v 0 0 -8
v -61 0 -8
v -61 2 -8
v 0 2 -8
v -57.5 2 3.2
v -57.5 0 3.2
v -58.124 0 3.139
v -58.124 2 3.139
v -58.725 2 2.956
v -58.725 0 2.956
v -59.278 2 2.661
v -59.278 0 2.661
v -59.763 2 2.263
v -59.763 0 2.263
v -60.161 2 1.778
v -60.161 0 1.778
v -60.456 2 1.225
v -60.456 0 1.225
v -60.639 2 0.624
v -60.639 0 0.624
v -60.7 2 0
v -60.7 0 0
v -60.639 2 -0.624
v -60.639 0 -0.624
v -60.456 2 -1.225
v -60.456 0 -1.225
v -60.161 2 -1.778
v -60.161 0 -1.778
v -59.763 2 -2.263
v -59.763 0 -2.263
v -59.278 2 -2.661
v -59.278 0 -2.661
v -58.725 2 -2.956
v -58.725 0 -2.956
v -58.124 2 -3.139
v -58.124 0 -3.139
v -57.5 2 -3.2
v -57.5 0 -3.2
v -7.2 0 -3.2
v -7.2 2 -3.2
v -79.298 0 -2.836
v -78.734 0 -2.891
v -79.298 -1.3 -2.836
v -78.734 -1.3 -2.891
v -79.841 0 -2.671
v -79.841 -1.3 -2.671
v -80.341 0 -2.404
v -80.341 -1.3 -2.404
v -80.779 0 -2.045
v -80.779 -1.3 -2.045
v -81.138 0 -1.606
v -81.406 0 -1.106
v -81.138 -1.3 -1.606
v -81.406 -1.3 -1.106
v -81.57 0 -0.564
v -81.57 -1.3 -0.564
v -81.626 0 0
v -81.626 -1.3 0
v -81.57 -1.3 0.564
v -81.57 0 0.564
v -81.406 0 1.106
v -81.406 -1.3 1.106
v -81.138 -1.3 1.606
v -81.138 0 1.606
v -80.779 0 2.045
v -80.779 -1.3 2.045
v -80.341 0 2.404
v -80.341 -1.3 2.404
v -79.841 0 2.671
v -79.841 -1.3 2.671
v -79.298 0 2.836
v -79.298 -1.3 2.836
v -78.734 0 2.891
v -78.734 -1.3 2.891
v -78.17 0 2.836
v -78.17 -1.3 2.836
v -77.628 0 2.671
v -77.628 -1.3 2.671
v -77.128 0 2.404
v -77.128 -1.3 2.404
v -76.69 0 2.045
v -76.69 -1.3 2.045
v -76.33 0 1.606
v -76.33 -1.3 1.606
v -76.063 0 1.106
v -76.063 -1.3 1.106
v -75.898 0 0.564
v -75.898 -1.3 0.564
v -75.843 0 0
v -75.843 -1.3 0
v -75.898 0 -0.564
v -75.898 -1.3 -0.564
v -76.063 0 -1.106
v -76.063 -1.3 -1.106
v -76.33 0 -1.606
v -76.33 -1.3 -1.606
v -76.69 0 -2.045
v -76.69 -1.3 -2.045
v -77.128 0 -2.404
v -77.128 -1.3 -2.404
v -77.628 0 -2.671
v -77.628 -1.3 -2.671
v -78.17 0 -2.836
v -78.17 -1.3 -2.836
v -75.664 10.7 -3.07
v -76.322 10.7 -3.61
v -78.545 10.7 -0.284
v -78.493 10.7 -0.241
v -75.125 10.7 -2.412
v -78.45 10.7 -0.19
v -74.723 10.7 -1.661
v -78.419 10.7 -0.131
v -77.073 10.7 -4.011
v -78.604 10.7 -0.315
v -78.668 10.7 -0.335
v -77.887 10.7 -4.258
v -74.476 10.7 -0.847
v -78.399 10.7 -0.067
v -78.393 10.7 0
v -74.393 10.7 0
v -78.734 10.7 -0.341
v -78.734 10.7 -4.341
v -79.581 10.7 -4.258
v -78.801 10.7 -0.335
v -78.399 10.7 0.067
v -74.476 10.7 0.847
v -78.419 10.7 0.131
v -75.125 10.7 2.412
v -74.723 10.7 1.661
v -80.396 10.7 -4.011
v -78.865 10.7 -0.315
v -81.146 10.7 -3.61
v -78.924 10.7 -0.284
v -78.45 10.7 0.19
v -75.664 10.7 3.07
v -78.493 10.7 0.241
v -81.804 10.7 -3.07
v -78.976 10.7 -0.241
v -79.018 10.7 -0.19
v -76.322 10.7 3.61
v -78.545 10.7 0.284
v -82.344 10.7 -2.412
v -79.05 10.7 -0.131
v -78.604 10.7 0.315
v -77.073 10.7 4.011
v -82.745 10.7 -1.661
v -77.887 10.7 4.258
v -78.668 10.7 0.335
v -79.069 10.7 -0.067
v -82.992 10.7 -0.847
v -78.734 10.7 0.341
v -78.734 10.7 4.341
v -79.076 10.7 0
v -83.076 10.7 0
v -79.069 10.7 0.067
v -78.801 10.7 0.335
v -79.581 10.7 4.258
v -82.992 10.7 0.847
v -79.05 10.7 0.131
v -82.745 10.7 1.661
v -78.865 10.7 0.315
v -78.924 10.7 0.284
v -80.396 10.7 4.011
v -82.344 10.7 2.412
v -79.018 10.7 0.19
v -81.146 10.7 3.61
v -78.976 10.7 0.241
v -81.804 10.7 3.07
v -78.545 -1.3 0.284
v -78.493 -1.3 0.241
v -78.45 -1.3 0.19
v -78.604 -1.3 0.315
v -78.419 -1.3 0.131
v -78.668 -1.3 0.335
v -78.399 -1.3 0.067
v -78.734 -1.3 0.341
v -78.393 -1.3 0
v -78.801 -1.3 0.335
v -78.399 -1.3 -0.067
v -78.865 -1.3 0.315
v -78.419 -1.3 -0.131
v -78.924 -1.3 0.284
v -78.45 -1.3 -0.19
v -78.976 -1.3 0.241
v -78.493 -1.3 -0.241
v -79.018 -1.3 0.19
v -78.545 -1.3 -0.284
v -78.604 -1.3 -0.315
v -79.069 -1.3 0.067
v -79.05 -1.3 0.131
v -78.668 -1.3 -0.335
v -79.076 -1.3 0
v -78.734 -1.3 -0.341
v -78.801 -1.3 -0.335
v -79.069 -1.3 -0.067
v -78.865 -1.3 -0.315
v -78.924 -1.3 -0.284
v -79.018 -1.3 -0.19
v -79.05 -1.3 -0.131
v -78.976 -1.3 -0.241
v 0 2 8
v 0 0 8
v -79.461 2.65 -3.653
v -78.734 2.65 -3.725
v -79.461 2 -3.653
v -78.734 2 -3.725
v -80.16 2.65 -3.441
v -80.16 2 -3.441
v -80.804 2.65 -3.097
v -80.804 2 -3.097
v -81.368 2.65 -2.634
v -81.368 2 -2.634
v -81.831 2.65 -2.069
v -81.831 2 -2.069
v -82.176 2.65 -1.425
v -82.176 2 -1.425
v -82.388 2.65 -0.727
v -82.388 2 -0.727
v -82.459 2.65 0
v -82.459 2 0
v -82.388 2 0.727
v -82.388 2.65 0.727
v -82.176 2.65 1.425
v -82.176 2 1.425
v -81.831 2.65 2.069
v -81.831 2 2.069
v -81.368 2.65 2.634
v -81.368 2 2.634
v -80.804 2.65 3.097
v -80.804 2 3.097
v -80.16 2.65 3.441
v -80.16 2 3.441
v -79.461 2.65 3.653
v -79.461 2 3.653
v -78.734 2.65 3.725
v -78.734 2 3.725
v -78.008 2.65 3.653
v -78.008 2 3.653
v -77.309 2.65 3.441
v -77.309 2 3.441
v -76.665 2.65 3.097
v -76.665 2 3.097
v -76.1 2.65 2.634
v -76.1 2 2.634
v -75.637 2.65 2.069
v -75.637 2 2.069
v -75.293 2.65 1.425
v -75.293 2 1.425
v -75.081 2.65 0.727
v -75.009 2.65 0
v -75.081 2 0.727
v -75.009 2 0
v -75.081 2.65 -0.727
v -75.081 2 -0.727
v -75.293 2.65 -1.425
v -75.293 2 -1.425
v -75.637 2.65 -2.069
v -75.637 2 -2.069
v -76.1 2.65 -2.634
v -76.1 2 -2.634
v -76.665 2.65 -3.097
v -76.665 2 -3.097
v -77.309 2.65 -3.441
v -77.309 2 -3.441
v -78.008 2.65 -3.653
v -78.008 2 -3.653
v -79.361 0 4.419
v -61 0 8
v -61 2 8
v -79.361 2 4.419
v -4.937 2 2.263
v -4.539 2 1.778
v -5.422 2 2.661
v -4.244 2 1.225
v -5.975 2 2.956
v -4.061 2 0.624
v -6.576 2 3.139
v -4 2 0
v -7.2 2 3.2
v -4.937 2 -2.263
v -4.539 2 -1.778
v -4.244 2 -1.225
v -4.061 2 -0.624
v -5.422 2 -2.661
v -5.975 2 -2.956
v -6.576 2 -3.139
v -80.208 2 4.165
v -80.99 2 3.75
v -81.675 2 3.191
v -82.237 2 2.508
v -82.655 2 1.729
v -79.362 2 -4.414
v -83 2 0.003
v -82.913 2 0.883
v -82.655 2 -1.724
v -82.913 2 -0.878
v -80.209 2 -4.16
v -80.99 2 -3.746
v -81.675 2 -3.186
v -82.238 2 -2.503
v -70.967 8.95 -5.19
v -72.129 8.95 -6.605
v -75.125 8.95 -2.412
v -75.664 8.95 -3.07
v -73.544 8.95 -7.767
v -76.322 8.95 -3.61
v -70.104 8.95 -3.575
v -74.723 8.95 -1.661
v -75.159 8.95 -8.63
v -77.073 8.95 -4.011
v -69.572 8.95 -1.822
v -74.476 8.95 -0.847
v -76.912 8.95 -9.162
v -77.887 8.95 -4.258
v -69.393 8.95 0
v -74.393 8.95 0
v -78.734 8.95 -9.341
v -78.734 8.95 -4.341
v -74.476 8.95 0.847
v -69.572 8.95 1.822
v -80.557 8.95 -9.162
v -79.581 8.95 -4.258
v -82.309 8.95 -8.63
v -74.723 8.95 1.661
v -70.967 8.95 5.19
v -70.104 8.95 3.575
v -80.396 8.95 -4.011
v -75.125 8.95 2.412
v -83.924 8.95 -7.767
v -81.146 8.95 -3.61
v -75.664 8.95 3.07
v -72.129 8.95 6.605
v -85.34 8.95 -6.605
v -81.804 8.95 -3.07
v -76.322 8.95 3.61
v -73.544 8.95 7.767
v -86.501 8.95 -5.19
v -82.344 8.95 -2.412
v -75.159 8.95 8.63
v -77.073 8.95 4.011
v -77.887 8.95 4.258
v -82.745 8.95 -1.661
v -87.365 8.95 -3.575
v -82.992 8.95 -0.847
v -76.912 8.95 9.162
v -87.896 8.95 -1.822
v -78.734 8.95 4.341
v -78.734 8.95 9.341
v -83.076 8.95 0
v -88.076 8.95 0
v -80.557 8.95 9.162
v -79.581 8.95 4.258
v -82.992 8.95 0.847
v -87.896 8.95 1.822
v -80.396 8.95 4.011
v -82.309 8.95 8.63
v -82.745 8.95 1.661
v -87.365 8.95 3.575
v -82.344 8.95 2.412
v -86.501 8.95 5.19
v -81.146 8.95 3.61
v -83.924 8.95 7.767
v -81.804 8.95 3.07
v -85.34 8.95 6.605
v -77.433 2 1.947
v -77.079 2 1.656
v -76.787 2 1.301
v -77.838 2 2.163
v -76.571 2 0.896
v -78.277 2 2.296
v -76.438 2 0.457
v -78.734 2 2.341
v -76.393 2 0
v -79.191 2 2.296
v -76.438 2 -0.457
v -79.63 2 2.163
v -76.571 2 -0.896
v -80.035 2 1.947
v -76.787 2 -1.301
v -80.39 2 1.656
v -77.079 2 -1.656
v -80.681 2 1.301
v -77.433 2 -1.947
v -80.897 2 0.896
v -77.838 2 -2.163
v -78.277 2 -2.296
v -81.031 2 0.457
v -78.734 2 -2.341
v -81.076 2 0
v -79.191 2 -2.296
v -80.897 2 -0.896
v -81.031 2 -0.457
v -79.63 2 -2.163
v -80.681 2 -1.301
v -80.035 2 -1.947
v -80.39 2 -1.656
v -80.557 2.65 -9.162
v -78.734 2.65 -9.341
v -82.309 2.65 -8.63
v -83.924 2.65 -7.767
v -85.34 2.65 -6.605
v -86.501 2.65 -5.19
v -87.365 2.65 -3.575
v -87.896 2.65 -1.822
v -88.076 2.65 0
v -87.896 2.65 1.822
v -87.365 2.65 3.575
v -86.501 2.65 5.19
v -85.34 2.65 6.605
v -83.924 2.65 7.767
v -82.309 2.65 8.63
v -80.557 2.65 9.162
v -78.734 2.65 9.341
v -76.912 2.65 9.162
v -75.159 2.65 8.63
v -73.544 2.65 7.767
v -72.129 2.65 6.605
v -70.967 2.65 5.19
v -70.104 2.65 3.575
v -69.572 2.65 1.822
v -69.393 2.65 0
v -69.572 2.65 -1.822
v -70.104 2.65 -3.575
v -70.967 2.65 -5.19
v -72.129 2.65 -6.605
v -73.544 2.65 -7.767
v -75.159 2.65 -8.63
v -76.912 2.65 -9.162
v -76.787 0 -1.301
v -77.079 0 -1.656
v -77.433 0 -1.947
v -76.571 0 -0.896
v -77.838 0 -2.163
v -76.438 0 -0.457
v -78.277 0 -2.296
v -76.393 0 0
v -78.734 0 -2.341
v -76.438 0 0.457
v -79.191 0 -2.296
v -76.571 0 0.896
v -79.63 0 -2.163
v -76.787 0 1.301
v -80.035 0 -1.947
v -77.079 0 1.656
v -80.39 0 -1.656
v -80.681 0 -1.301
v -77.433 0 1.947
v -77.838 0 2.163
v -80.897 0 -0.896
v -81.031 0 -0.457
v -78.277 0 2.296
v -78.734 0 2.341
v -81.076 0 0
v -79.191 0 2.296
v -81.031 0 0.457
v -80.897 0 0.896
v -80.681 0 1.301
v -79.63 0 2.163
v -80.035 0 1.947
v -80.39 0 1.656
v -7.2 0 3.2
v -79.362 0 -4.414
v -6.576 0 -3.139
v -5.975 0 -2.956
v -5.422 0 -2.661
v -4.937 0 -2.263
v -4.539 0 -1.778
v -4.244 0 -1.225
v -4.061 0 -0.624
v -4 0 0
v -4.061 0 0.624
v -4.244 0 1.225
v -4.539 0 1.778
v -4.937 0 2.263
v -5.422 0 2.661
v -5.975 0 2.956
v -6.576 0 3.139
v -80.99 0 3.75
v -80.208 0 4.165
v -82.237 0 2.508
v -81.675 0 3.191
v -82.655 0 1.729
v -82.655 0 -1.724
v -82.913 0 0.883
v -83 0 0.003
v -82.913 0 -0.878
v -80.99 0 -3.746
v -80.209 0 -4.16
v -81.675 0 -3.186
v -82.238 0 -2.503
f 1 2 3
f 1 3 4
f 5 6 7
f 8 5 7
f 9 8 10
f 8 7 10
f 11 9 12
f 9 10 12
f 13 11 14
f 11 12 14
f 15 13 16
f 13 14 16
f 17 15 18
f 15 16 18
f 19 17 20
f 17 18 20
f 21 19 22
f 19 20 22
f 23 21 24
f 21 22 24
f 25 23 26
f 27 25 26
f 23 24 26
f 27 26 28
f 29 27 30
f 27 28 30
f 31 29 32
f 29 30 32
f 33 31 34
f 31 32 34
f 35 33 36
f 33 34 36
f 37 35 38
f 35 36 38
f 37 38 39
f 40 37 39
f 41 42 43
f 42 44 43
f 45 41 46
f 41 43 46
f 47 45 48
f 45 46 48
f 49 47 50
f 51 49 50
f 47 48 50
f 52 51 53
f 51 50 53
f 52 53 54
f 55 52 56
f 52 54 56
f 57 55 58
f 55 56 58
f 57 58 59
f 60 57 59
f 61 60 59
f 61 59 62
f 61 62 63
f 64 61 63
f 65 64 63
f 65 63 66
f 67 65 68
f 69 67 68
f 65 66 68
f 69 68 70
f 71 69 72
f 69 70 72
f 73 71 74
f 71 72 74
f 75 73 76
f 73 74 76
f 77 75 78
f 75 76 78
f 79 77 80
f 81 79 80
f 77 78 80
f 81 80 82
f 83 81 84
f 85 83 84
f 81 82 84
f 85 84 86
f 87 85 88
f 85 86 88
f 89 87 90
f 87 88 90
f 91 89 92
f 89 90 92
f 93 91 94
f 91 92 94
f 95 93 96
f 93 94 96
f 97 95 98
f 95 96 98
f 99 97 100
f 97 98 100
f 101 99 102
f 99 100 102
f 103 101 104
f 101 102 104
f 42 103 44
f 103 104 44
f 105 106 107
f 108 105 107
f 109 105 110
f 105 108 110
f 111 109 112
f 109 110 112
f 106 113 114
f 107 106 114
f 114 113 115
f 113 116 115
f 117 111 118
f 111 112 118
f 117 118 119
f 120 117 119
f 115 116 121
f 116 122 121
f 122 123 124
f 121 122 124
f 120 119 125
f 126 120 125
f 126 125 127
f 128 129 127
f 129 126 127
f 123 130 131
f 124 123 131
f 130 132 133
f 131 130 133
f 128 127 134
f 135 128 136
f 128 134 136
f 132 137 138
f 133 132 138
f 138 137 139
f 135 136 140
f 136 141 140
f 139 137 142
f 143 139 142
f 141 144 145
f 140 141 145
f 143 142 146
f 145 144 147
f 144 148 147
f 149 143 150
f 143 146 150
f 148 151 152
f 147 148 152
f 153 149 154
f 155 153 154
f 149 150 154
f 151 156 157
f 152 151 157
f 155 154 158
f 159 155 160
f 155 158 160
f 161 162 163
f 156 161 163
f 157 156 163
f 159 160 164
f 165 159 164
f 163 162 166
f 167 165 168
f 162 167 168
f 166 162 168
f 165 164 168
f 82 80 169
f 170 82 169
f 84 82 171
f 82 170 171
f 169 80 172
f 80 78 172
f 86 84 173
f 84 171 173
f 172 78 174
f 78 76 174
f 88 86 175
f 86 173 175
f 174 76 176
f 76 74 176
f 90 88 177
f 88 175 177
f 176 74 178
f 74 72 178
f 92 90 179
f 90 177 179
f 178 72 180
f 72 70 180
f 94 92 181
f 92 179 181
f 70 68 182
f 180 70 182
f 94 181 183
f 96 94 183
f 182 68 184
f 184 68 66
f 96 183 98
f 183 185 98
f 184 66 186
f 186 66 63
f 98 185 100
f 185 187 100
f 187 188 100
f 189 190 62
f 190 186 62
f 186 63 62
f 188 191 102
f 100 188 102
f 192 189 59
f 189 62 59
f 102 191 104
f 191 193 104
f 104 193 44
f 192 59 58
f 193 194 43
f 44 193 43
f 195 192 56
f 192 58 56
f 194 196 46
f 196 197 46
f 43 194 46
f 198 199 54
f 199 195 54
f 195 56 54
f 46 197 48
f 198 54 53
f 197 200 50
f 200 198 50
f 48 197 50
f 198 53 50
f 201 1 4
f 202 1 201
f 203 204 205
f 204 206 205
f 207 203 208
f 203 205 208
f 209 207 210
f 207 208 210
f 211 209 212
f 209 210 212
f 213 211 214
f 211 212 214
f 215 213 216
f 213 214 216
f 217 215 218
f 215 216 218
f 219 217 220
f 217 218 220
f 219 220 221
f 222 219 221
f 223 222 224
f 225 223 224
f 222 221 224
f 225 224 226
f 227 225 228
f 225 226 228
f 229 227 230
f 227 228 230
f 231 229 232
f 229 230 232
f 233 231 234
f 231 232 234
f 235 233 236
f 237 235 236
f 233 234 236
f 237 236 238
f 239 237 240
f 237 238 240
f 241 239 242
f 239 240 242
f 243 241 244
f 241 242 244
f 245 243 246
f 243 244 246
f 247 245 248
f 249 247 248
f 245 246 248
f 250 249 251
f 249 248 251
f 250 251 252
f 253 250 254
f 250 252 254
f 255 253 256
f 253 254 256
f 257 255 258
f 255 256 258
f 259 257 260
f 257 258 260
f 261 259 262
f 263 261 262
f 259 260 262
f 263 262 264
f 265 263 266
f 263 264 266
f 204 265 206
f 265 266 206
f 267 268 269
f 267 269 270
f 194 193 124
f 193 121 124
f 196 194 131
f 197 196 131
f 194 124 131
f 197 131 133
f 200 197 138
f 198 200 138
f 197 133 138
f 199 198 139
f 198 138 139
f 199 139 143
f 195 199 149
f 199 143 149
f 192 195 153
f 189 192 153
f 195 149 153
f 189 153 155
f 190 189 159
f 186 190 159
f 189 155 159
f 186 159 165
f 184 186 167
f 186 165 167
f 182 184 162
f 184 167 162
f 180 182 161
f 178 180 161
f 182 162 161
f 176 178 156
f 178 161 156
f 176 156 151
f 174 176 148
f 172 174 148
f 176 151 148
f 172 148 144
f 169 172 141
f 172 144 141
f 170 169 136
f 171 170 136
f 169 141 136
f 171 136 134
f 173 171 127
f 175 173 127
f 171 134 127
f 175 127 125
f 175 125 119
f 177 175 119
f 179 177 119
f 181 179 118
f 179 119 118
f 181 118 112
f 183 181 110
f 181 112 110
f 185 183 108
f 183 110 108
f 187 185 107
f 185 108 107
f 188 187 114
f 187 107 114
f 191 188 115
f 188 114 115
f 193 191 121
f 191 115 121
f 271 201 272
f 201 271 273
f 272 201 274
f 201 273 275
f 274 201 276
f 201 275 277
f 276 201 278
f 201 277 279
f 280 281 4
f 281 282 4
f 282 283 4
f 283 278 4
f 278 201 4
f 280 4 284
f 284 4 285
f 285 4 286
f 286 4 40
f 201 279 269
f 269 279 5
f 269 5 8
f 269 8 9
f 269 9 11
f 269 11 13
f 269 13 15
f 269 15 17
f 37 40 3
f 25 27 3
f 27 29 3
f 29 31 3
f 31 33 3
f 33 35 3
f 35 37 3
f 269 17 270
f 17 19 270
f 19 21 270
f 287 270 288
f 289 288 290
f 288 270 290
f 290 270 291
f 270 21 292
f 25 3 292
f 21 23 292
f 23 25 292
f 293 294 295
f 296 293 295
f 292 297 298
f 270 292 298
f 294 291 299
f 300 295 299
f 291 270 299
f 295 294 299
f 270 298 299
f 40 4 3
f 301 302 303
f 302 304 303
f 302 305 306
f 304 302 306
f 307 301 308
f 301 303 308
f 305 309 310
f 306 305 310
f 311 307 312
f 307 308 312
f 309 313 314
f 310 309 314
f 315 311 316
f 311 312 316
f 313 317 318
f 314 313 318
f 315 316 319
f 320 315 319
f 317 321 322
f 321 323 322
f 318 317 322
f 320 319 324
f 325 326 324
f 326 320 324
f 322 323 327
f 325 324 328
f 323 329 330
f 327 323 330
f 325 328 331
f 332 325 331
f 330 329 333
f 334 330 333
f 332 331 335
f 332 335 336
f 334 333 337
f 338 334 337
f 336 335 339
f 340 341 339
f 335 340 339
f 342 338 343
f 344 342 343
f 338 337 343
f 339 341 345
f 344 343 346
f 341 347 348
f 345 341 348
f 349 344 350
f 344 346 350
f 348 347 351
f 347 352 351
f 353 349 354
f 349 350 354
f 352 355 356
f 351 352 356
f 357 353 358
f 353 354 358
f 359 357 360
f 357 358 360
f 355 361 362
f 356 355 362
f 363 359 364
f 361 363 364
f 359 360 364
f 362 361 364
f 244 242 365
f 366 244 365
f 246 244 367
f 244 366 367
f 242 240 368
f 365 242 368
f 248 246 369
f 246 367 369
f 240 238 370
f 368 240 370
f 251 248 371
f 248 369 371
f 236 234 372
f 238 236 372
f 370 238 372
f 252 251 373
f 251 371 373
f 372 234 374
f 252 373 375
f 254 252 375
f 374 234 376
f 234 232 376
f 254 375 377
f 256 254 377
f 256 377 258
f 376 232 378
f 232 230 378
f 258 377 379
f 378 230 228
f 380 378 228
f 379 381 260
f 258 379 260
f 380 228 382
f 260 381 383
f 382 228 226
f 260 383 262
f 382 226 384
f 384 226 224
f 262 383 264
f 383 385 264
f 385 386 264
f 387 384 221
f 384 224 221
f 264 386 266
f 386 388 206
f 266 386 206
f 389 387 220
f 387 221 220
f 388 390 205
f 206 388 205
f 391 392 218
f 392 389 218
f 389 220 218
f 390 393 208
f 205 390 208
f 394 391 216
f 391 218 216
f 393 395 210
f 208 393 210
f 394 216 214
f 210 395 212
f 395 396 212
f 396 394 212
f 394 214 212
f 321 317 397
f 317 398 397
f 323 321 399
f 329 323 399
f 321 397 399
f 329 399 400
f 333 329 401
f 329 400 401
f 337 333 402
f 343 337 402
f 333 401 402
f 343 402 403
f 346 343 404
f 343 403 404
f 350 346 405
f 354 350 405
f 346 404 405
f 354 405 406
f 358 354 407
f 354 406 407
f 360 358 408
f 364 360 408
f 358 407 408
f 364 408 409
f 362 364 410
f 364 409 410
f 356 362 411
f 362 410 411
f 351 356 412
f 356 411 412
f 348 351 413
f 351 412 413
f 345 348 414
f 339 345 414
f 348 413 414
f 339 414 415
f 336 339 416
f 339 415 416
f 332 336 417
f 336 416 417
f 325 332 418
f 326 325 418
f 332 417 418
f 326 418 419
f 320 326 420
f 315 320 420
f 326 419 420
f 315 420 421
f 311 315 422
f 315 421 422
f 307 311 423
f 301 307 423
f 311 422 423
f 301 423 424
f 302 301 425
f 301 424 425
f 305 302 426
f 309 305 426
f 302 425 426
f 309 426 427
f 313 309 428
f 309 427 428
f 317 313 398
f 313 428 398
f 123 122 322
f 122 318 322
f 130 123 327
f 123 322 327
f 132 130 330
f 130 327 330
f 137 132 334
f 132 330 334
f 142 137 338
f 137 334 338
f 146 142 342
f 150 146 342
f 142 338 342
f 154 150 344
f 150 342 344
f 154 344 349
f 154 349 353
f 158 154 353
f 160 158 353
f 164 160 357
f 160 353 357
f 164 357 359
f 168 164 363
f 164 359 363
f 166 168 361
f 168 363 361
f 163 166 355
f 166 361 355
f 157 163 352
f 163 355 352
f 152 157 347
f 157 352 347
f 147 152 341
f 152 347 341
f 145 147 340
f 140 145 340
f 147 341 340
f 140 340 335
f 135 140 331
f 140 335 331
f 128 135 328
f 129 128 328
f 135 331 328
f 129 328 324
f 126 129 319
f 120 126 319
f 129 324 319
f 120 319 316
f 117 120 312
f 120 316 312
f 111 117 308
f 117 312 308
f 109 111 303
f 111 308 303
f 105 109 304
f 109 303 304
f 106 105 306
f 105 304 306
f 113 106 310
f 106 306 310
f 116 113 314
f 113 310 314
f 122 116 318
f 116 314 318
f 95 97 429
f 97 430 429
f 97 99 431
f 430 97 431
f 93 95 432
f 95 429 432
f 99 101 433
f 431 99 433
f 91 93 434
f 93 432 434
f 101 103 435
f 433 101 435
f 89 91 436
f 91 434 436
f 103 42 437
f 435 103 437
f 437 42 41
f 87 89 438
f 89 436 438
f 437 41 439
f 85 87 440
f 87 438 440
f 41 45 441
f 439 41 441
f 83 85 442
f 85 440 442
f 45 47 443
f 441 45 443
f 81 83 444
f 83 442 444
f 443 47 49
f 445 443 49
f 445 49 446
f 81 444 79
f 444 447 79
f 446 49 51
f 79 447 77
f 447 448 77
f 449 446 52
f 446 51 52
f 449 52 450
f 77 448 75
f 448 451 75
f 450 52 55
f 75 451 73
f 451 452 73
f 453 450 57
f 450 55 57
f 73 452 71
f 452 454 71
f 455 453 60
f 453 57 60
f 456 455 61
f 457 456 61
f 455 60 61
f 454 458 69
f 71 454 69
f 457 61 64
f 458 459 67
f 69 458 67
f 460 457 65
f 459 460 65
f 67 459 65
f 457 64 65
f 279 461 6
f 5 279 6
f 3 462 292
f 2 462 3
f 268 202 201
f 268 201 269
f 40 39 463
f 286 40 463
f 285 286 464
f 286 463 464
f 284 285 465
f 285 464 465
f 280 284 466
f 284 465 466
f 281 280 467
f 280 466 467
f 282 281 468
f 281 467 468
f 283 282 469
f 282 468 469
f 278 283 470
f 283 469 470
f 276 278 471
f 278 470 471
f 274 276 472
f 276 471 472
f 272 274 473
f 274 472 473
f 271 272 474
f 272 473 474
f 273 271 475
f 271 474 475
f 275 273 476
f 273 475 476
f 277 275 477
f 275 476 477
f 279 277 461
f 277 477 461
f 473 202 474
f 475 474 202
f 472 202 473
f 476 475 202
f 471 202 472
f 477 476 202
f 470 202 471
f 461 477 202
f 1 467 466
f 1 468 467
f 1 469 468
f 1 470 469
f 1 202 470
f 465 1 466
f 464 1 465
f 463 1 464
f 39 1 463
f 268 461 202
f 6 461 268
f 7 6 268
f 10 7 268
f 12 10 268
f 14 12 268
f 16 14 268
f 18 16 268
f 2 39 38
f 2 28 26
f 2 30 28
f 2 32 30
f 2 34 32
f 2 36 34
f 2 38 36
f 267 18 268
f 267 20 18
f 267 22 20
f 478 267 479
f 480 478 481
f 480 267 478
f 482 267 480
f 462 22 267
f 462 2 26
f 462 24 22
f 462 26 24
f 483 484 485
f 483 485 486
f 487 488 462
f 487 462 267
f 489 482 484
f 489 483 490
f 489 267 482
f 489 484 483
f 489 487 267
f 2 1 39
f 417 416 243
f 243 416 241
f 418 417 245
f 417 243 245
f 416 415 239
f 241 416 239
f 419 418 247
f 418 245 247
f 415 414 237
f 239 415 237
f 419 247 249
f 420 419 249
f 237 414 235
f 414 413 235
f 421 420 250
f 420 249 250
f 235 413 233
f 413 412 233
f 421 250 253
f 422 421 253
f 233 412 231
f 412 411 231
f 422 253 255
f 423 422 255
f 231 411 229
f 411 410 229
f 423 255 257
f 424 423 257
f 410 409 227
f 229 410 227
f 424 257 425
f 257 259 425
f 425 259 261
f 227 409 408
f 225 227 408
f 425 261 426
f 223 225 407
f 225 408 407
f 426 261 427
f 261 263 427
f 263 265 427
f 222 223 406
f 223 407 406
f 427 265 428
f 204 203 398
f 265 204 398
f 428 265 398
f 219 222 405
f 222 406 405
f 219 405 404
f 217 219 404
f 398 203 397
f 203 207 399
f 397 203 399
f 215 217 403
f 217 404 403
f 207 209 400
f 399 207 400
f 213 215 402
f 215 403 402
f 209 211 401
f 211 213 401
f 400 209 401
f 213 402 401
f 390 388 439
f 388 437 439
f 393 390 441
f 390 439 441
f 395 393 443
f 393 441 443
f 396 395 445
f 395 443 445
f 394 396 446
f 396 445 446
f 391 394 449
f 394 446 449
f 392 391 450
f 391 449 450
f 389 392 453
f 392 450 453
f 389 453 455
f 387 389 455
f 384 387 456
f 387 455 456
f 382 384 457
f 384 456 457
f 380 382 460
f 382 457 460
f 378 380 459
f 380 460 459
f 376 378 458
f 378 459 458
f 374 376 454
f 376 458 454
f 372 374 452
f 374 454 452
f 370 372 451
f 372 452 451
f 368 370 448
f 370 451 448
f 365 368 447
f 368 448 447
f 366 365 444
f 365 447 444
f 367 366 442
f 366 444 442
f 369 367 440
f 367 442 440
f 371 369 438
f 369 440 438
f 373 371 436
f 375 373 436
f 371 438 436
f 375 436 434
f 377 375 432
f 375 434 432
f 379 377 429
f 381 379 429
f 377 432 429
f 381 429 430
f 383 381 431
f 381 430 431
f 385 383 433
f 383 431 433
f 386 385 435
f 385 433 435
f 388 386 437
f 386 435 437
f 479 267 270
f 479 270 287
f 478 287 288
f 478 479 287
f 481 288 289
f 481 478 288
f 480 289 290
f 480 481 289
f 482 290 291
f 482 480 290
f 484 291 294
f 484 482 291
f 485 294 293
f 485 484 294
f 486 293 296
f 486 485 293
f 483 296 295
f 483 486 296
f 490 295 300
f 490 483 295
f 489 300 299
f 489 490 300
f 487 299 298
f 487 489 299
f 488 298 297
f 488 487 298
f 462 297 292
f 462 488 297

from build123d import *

# Parameters (mm, degrees)
EXTRUDE1_DEPTH = 2


with BuildPart() as part:
    # Sketch1 → Extrude1 (new body)
    with BuildSketch(Plane(origin=(0, 0, 0), x_dir=(1, 0, 0), z_dir=(0, 1, 0))):
        with BuildLine():
            Line((-61, 8), (0, 8))
            Line((0, 8), (0, -8))
            Line((0, -8), (-61, -8))
            Line((-61, -8), (-79.361011839, -4.418933189))
            ThreePointArc((-79.361011839, -4.418933189), (-82.999578751, -0.002663498), (-79.362010432, 4.414428743))
            Line((-79.362010432, 4.414428743), (-61, 8))
        make_face()
        with BuildLine():
            Line((-57.5, 3.2), (-7.2, 3.2))
            ThreePointArc((-7.2, 3.2), (-4, 0), (-7.2, -3.2))
            Line((-7.2, -3.2), (-57.5, -3.2))
            ThreePointArc((-57.5, -3.2), (-60.7, 0), (-57.5, 3.2))
        make_face(mode=Mode.SUBTRACT)
    extrude(amount=EXTRUDE1_DEPTH)


with BuildPart() as body_2:
    # Sketch2 → Revolve1 (revolve)
    with BuildSketch(Plane.XY, mode=Mode.PRIVATE) as revolve1_sk:
        Polygon((-76.392872799, 0), (-75.842872799, 0), (-75.842872799, -1.3), (-78.392872799, -1.3), (-78.392872799, 10.7), (-74.392872799, 10.7), (-74.392872799, 8.95), (-69.392872799, 8.95), (-69.392872799, 2.65), (-75.009396698, 2.65), (-75.009396698, 2), (-76.392872799, 2), align=None)
    revolve(revolve1_sk.sketch.rotate(Axis((-78.734267231, 1.065940946, 0), (0, 1, 0)), 90), axis=Axis((-78.734267231, 1.065940946, 0), (0, 1, 0)))


solid = Compound([part.part, body_2.part])
